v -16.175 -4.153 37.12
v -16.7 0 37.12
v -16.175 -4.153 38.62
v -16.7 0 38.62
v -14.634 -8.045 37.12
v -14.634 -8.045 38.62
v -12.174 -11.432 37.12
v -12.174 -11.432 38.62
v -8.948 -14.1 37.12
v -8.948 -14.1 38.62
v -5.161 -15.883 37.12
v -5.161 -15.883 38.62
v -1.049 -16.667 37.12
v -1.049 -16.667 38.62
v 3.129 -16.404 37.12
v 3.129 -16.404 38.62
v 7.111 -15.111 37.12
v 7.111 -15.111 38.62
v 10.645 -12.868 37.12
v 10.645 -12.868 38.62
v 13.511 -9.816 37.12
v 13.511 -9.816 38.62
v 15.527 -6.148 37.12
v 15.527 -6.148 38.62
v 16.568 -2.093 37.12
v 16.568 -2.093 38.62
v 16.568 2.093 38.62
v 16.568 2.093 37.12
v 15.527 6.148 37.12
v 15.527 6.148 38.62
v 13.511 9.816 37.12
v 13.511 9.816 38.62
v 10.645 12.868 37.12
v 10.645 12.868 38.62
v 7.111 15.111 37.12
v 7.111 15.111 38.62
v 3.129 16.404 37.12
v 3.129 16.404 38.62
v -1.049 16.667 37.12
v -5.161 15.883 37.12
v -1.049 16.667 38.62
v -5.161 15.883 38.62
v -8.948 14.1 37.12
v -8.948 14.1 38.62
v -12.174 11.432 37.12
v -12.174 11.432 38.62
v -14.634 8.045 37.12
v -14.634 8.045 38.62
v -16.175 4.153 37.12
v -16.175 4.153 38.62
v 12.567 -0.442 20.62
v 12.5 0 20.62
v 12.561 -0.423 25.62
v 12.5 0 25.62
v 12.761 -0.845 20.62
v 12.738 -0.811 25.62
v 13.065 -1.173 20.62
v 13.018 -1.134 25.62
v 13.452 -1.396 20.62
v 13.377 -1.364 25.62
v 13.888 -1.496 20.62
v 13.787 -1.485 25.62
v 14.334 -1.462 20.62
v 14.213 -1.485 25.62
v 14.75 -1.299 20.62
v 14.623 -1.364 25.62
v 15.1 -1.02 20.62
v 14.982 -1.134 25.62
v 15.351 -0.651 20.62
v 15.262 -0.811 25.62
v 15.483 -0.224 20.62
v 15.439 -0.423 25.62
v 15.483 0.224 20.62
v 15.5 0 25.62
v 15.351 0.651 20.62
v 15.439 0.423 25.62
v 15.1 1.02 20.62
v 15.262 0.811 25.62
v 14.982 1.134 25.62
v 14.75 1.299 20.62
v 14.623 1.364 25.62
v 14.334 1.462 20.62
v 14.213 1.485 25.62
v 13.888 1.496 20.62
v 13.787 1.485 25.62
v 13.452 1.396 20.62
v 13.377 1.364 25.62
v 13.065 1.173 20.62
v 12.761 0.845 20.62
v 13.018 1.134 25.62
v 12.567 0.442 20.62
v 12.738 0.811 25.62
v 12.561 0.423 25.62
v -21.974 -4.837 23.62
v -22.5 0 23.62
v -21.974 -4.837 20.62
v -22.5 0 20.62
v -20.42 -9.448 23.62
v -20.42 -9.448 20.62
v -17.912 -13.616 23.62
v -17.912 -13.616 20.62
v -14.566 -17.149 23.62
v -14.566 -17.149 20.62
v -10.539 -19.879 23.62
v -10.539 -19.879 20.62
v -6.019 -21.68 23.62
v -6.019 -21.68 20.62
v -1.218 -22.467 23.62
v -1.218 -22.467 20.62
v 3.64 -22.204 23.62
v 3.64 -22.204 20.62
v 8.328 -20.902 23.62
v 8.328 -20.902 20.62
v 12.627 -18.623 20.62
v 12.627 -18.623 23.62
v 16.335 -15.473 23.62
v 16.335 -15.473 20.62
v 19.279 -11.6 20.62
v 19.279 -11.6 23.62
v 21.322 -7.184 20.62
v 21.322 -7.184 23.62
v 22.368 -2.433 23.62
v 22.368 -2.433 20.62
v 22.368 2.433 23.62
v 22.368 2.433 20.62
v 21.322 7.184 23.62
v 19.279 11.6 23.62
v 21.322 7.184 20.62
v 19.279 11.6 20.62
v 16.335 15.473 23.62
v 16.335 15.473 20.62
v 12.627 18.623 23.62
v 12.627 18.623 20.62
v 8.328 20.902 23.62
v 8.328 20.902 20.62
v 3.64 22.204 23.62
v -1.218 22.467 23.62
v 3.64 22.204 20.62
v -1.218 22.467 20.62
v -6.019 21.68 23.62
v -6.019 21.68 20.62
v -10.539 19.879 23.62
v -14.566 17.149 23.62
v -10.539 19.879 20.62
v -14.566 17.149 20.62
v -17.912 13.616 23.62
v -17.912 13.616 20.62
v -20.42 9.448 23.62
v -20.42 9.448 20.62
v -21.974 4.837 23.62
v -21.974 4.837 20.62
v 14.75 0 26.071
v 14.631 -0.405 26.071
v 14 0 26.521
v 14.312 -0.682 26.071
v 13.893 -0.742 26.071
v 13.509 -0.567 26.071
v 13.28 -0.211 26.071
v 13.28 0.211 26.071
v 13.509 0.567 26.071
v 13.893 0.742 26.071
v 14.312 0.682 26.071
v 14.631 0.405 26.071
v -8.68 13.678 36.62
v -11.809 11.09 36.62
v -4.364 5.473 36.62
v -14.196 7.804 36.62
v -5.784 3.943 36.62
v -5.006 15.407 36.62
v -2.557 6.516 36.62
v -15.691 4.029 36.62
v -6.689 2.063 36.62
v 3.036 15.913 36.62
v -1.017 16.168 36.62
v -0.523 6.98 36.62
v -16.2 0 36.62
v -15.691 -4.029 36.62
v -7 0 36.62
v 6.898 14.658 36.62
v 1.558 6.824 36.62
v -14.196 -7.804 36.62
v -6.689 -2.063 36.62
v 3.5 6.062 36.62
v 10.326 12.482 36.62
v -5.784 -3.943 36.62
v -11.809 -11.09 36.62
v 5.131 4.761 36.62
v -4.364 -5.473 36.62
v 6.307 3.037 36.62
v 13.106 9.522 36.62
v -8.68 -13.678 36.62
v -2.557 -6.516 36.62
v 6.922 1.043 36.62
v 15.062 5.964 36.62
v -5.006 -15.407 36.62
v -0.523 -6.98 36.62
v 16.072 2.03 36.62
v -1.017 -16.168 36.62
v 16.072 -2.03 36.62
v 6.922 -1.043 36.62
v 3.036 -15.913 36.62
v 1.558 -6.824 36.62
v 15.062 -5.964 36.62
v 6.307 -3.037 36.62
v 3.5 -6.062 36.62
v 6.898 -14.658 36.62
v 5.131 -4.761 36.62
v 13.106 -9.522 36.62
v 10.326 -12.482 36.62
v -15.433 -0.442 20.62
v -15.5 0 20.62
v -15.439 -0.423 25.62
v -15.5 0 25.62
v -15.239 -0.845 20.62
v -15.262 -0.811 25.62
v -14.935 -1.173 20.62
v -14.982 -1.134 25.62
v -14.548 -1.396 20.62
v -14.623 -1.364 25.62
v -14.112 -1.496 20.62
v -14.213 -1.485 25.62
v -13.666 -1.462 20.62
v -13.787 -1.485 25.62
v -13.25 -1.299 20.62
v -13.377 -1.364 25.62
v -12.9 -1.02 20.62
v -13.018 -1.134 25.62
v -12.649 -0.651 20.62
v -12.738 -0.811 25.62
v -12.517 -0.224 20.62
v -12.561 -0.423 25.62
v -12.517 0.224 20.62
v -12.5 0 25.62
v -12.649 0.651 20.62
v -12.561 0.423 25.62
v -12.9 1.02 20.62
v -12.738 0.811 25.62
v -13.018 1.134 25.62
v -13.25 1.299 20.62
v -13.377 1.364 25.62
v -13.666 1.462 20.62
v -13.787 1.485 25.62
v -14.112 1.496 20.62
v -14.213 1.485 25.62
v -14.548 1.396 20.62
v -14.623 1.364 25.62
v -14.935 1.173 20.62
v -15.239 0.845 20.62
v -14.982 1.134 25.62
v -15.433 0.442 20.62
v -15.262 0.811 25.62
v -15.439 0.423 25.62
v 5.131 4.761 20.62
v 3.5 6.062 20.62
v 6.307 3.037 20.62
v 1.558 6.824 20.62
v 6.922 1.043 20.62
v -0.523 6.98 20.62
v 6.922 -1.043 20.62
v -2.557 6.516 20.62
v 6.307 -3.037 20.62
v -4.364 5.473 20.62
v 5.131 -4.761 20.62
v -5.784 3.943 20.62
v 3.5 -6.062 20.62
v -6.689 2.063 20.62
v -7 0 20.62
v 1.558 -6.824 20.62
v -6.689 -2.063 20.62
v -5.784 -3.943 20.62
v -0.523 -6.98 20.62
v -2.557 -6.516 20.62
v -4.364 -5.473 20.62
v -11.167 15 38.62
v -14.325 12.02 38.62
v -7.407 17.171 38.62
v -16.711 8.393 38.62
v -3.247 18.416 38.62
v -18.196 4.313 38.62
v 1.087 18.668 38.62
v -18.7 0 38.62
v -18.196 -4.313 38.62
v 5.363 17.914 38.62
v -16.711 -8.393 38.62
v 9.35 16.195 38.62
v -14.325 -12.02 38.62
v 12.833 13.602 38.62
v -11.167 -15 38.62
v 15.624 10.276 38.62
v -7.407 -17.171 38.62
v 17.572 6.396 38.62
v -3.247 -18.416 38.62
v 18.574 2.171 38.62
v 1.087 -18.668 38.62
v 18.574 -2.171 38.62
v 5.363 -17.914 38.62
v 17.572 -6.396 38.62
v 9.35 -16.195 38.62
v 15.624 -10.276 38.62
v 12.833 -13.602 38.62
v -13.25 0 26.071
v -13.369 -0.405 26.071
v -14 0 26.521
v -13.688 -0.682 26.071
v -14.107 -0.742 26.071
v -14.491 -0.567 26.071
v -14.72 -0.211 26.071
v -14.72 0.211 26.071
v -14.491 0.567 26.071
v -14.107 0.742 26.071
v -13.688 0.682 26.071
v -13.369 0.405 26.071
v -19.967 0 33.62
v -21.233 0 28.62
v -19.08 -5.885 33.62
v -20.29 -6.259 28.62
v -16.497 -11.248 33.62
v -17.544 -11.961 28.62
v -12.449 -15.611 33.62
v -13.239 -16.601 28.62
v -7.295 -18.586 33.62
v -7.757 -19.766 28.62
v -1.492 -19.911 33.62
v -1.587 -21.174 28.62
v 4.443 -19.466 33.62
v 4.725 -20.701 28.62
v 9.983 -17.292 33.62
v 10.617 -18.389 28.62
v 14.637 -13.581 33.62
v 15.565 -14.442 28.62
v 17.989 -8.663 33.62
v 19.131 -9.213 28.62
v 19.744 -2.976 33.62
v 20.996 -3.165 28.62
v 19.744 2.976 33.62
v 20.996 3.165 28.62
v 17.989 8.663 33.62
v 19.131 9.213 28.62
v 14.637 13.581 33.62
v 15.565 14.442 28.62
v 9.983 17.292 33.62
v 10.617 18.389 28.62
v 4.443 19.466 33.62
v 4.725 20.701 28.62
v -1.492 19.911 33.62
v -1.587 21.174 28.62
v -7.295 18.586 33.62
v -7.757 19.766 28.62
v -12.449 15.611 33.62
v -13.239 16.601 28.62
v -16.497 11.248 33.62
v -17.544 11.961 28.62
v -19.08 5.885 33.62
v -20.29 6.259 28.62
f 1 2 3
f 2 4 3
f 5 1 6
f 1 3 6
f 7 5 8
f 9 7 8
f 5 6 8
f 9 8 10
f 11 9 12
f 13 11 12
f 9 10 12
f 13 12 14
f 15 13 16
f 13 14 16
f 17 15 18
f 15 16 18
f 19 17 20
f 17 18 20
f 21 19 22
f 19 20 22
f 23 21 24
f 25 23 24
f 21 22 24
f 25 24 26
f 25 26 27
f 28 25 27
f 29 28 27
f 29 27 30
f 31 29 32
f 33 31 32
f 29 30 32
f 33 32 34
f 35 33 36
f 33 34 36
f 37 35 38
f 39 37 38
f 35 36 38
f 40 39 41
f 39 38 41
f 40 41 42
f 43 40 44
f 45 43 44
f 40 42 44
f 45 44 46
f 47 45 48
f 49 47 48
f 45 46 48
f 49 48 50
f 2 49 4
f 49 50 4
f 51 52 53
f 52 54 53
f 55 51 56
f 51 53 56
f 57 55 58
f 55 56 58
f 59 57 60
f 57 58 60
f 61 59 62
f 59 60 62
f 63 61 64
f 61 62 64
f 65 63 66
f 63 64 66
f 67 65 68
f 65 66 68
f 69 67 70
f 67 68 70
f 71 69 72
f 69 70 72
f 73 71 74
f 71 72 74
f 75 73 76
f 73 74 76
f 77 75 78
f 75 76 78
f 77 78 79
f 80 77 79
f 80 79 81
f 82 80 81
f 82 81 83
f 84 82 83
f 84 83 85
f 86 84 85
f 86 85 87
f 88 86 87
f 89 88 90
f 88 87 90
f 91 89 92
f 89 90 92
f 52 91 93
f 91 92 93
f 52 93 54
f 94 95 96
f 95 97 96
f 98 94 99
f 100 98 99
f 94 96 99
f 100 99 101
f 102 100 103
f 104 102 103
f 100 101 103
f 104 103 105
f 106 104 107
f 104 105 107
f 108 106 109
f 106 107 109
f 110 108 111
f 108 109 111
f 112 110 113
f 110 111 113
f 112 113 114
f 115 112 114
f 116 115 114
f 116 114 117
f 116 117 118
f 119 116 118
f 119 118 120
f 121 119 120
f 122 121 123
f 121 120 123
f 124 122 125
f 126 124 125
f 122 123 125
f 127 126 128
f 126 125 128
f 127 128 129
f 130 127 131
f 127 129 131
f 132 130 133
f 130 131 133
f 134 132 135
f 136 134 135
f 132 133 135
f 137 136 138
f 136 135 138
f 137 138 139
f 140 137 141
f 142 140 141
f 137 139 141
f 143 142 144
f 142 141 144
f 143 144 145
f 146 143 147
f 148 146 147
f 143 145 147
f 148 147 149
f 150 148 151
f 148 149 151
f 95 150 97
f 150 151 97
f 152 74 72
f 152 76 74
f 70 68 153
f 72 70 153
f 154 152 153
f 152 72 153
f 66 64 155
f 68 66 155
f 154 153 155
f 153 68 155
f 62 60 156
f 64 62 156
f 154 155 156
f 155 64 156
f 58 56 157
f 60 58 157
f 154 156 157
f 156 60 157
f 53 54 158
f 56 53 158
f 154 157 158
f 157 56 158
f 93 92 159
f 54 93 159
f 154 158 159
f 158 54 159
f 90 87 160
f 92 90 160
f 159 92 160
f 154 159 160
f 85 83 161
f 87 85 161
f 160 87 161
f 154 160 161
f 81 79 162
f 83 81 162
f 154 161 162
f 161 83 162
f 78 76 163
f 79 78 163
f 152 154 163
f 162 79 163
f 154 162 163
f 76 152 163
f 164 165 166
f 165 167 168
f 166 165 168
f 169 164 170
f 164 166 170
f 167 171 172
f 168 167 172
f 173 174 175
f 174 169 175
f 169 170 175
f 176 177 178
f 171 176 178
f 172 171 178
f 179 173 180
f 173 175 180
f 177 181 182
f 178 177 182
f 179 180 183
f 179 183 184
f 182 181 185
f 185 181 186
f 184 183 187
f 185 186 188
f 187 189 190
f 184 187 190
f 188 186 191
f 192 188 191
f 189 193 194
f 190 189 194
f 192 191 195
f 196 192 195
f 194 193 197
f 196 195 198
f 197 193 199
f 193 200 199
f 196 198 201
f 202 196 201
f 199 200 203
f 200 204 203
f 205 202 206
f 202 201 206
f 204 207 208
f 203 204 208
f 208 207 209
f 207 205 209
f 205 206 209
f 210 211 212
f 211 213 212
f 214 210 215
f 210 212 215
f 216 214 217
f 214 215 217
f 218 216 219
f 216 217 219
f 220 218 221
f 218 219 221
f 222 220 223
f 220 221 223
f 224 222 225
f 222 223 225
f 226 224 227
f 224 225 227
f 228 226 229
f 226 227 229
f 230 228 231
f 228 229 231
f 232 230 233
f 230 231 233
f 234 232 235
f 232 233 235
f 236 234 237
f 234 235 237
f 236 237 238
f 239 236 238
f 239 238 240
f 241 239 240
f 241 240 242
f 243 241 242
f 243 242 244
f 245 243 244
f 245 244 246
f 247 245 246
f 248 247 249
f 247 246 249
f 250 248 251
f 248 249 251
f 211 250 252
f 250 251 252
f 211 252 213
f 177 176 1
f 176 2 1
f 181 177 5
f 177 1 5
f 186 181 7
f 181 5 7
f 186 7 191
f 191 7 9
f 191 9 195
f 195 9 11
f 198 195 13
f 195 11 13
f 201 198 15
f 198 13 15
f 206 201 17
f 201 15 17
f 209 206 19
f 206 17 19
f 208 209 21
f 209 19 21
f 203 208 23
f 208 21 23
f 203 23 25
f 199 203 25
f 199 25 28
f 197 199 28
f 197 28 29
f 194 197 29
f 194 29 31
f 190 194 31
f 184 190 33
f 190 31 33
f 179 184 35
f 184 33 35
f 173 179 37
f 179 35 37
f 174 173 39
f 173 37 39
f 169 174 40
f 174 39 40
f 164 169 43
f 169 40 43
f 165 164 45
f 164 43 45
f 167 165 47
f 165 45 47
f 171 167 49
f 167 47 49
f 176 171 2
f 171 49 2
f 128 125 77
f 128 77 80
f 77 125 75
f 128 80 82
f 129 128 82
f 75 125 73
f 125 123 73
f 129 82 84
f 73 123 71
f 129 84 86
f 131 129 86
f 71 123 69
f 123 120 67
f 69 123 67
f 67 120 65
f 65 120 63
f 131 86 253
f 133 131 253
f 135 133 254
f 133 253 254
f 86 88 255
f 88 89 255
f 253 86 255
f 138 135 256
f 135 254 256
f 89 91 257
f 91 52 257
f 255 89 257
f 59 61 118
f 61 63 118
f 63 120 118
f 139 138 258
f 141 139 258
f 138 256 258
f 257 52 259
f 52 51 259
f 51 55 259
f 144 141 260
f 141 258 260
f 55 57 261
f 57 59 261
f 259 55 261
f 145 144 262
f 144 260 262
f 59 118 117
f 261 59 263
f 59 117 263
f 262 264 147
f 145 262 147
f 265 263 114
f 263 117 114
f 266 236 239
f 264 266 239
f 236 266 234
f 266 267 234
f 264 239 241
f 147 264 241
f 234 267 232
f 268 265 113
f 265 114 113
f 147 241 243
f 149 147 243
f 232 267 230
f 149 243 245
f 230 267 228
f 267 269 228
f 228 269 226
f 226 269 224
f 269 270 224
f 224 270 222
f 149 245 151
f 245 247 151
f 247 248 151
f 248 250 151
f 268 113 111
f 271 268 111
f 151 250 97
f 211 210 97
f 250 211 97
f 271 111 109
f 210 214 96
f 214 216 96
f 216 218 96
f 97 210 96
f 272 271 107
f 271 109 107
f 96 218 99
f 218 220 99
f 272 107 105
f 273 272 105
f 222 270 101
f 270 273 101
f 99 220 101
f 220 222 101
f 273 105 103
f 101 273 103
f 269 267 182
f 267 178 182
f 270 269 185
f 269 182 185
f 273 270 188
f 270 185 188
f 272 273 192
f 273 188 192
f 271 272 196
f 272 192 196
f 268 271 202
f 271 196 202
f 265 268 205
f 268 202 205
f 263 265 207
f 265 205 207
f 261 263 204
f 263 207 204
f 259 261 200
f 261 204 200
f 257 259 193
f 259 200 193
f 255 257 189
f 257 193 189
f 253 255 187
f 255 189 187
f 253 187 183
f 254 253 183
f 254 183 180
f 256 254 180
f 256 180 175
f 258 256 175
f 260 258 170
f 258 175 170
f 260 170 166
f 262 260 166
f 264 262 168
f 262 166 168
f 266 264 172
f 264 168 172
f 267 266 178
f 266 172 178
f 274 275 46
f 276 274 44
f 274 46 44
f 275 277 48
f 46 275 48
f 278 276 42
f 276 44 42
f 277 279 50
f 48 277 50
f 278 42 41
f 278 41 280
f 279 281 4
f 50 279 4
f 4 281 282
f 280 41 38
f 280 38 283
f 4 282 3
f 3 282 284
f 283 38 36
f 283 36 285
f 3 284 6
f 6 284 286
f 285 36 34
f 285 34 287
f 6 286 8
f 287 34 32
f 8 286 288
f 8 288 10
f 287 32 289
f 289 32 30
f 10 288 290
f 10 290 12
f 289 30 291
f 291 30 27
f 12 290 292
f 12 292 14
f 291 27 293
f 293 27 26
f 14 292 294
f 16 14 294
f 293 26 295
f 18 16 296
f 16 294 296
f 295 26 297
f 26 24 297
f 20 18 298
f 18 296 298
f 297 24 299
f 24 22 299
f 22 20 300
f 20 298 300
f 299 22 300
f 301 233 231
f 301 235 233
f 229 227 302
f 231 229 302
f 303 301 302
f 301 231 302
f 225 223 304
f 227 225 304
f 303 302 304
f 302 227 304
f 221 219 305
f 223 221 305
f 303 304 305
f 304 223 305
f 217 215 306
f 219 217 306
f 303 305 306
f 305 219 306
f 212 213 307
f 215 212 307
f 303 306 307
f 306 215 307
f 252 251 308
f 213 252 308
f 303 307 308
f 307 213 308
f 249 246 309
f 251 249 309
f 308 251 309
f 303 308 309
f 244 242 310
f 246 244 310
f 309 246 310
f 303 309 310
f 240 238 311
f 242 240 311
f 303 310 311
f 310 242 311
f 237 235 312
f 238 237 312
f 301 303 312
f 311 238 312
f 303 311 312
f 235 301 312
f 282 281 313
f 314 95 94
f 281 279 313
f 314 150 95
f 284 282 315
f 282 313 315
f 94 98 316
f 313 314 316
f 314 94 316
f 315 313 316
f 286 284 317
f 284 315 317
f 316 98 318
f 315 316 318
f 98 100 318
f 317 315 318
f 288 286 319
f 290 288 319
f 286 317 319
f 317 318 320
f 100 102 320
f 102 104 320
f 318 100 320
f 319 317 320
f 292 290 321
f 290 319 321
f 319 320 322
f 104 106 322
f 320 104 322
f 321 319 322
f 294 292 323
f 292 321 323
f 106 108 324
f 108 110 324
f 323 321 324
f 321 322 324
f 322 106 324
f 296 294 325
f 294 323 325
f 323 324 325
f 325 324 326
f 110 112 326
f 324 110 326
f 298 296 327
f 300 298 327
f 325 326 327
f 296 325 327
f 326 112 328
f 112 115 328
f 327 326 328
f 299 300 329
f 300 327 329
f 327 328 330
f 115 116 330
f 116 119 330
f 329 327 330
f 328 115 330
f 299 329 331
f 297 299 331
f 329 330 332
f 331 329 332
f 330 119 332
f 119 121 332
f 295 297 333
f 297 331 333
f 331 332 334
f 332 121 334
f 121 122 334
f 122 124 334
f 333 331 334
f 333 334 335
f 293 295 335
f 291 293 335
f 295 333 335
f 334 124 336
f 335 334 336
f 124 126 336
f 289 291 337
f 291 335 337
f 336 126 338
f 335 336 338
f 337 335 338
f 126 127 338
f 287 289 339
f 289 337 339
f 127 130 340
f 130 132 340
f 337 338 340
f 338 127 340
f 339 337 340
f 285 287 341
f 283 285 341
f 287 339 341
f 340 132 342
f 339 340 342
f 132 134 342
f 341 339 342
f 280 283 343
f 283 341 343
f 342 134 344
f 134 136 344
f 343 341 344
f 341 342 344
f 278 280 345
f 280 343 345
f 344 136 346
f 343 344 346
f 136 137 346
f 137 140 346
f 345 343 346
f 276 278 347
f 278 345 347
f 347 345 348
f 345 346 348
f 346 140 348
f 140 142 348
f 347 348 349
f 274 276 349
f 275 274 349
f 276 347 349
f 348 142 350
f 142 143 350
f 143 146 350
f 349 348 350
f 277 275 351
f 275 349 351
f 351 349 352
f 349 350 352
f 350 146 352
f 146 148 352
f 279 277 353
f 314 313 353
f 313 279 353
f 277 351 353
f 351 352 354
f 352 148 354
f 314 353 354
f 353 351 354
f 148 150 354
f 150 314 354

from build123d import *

# Parameters (mm, degrees)
F3_D     = 3
F3_DEPTH = 5
F3_TIP   = 0.9012909285


with BuildPart() as f1:
    # F0 (on Front) → F1 (revolve)
    with BuildSketch(Plane.XZ):
        Polygon((-22.5, 20.6200371981), (-7, 20.6200371981), (-7, 36.6200371981), (-16.2, 36.6200371981), (-16.7, 37.1200371981), (-16.7, 38.6200371981), (-18.7, 38.6200371981), (-22.5, 23.6200371981), align=None)
    revolve(axis=Axis((0, 0, 28.6200371981), (0, 0, 1)))

    # F3
    with Locations(Plane(origin=(0, 0, 20.6200371981), x_dir=(1, 0, 0), z_dir=(0, 0, -1))):
        with Locations((-14, 0), (14, 0)):
            Hole(F3_D / 2, depth=F3_DEPTH)
            with Locations((0, 0, -(F3_DEPTH + F3_TIP / 2))):  # 118° drill point
                Cone(0, F3_D / 2, F3_TIP, mode=Mode.SUBTRACT)


solid = f1.part
